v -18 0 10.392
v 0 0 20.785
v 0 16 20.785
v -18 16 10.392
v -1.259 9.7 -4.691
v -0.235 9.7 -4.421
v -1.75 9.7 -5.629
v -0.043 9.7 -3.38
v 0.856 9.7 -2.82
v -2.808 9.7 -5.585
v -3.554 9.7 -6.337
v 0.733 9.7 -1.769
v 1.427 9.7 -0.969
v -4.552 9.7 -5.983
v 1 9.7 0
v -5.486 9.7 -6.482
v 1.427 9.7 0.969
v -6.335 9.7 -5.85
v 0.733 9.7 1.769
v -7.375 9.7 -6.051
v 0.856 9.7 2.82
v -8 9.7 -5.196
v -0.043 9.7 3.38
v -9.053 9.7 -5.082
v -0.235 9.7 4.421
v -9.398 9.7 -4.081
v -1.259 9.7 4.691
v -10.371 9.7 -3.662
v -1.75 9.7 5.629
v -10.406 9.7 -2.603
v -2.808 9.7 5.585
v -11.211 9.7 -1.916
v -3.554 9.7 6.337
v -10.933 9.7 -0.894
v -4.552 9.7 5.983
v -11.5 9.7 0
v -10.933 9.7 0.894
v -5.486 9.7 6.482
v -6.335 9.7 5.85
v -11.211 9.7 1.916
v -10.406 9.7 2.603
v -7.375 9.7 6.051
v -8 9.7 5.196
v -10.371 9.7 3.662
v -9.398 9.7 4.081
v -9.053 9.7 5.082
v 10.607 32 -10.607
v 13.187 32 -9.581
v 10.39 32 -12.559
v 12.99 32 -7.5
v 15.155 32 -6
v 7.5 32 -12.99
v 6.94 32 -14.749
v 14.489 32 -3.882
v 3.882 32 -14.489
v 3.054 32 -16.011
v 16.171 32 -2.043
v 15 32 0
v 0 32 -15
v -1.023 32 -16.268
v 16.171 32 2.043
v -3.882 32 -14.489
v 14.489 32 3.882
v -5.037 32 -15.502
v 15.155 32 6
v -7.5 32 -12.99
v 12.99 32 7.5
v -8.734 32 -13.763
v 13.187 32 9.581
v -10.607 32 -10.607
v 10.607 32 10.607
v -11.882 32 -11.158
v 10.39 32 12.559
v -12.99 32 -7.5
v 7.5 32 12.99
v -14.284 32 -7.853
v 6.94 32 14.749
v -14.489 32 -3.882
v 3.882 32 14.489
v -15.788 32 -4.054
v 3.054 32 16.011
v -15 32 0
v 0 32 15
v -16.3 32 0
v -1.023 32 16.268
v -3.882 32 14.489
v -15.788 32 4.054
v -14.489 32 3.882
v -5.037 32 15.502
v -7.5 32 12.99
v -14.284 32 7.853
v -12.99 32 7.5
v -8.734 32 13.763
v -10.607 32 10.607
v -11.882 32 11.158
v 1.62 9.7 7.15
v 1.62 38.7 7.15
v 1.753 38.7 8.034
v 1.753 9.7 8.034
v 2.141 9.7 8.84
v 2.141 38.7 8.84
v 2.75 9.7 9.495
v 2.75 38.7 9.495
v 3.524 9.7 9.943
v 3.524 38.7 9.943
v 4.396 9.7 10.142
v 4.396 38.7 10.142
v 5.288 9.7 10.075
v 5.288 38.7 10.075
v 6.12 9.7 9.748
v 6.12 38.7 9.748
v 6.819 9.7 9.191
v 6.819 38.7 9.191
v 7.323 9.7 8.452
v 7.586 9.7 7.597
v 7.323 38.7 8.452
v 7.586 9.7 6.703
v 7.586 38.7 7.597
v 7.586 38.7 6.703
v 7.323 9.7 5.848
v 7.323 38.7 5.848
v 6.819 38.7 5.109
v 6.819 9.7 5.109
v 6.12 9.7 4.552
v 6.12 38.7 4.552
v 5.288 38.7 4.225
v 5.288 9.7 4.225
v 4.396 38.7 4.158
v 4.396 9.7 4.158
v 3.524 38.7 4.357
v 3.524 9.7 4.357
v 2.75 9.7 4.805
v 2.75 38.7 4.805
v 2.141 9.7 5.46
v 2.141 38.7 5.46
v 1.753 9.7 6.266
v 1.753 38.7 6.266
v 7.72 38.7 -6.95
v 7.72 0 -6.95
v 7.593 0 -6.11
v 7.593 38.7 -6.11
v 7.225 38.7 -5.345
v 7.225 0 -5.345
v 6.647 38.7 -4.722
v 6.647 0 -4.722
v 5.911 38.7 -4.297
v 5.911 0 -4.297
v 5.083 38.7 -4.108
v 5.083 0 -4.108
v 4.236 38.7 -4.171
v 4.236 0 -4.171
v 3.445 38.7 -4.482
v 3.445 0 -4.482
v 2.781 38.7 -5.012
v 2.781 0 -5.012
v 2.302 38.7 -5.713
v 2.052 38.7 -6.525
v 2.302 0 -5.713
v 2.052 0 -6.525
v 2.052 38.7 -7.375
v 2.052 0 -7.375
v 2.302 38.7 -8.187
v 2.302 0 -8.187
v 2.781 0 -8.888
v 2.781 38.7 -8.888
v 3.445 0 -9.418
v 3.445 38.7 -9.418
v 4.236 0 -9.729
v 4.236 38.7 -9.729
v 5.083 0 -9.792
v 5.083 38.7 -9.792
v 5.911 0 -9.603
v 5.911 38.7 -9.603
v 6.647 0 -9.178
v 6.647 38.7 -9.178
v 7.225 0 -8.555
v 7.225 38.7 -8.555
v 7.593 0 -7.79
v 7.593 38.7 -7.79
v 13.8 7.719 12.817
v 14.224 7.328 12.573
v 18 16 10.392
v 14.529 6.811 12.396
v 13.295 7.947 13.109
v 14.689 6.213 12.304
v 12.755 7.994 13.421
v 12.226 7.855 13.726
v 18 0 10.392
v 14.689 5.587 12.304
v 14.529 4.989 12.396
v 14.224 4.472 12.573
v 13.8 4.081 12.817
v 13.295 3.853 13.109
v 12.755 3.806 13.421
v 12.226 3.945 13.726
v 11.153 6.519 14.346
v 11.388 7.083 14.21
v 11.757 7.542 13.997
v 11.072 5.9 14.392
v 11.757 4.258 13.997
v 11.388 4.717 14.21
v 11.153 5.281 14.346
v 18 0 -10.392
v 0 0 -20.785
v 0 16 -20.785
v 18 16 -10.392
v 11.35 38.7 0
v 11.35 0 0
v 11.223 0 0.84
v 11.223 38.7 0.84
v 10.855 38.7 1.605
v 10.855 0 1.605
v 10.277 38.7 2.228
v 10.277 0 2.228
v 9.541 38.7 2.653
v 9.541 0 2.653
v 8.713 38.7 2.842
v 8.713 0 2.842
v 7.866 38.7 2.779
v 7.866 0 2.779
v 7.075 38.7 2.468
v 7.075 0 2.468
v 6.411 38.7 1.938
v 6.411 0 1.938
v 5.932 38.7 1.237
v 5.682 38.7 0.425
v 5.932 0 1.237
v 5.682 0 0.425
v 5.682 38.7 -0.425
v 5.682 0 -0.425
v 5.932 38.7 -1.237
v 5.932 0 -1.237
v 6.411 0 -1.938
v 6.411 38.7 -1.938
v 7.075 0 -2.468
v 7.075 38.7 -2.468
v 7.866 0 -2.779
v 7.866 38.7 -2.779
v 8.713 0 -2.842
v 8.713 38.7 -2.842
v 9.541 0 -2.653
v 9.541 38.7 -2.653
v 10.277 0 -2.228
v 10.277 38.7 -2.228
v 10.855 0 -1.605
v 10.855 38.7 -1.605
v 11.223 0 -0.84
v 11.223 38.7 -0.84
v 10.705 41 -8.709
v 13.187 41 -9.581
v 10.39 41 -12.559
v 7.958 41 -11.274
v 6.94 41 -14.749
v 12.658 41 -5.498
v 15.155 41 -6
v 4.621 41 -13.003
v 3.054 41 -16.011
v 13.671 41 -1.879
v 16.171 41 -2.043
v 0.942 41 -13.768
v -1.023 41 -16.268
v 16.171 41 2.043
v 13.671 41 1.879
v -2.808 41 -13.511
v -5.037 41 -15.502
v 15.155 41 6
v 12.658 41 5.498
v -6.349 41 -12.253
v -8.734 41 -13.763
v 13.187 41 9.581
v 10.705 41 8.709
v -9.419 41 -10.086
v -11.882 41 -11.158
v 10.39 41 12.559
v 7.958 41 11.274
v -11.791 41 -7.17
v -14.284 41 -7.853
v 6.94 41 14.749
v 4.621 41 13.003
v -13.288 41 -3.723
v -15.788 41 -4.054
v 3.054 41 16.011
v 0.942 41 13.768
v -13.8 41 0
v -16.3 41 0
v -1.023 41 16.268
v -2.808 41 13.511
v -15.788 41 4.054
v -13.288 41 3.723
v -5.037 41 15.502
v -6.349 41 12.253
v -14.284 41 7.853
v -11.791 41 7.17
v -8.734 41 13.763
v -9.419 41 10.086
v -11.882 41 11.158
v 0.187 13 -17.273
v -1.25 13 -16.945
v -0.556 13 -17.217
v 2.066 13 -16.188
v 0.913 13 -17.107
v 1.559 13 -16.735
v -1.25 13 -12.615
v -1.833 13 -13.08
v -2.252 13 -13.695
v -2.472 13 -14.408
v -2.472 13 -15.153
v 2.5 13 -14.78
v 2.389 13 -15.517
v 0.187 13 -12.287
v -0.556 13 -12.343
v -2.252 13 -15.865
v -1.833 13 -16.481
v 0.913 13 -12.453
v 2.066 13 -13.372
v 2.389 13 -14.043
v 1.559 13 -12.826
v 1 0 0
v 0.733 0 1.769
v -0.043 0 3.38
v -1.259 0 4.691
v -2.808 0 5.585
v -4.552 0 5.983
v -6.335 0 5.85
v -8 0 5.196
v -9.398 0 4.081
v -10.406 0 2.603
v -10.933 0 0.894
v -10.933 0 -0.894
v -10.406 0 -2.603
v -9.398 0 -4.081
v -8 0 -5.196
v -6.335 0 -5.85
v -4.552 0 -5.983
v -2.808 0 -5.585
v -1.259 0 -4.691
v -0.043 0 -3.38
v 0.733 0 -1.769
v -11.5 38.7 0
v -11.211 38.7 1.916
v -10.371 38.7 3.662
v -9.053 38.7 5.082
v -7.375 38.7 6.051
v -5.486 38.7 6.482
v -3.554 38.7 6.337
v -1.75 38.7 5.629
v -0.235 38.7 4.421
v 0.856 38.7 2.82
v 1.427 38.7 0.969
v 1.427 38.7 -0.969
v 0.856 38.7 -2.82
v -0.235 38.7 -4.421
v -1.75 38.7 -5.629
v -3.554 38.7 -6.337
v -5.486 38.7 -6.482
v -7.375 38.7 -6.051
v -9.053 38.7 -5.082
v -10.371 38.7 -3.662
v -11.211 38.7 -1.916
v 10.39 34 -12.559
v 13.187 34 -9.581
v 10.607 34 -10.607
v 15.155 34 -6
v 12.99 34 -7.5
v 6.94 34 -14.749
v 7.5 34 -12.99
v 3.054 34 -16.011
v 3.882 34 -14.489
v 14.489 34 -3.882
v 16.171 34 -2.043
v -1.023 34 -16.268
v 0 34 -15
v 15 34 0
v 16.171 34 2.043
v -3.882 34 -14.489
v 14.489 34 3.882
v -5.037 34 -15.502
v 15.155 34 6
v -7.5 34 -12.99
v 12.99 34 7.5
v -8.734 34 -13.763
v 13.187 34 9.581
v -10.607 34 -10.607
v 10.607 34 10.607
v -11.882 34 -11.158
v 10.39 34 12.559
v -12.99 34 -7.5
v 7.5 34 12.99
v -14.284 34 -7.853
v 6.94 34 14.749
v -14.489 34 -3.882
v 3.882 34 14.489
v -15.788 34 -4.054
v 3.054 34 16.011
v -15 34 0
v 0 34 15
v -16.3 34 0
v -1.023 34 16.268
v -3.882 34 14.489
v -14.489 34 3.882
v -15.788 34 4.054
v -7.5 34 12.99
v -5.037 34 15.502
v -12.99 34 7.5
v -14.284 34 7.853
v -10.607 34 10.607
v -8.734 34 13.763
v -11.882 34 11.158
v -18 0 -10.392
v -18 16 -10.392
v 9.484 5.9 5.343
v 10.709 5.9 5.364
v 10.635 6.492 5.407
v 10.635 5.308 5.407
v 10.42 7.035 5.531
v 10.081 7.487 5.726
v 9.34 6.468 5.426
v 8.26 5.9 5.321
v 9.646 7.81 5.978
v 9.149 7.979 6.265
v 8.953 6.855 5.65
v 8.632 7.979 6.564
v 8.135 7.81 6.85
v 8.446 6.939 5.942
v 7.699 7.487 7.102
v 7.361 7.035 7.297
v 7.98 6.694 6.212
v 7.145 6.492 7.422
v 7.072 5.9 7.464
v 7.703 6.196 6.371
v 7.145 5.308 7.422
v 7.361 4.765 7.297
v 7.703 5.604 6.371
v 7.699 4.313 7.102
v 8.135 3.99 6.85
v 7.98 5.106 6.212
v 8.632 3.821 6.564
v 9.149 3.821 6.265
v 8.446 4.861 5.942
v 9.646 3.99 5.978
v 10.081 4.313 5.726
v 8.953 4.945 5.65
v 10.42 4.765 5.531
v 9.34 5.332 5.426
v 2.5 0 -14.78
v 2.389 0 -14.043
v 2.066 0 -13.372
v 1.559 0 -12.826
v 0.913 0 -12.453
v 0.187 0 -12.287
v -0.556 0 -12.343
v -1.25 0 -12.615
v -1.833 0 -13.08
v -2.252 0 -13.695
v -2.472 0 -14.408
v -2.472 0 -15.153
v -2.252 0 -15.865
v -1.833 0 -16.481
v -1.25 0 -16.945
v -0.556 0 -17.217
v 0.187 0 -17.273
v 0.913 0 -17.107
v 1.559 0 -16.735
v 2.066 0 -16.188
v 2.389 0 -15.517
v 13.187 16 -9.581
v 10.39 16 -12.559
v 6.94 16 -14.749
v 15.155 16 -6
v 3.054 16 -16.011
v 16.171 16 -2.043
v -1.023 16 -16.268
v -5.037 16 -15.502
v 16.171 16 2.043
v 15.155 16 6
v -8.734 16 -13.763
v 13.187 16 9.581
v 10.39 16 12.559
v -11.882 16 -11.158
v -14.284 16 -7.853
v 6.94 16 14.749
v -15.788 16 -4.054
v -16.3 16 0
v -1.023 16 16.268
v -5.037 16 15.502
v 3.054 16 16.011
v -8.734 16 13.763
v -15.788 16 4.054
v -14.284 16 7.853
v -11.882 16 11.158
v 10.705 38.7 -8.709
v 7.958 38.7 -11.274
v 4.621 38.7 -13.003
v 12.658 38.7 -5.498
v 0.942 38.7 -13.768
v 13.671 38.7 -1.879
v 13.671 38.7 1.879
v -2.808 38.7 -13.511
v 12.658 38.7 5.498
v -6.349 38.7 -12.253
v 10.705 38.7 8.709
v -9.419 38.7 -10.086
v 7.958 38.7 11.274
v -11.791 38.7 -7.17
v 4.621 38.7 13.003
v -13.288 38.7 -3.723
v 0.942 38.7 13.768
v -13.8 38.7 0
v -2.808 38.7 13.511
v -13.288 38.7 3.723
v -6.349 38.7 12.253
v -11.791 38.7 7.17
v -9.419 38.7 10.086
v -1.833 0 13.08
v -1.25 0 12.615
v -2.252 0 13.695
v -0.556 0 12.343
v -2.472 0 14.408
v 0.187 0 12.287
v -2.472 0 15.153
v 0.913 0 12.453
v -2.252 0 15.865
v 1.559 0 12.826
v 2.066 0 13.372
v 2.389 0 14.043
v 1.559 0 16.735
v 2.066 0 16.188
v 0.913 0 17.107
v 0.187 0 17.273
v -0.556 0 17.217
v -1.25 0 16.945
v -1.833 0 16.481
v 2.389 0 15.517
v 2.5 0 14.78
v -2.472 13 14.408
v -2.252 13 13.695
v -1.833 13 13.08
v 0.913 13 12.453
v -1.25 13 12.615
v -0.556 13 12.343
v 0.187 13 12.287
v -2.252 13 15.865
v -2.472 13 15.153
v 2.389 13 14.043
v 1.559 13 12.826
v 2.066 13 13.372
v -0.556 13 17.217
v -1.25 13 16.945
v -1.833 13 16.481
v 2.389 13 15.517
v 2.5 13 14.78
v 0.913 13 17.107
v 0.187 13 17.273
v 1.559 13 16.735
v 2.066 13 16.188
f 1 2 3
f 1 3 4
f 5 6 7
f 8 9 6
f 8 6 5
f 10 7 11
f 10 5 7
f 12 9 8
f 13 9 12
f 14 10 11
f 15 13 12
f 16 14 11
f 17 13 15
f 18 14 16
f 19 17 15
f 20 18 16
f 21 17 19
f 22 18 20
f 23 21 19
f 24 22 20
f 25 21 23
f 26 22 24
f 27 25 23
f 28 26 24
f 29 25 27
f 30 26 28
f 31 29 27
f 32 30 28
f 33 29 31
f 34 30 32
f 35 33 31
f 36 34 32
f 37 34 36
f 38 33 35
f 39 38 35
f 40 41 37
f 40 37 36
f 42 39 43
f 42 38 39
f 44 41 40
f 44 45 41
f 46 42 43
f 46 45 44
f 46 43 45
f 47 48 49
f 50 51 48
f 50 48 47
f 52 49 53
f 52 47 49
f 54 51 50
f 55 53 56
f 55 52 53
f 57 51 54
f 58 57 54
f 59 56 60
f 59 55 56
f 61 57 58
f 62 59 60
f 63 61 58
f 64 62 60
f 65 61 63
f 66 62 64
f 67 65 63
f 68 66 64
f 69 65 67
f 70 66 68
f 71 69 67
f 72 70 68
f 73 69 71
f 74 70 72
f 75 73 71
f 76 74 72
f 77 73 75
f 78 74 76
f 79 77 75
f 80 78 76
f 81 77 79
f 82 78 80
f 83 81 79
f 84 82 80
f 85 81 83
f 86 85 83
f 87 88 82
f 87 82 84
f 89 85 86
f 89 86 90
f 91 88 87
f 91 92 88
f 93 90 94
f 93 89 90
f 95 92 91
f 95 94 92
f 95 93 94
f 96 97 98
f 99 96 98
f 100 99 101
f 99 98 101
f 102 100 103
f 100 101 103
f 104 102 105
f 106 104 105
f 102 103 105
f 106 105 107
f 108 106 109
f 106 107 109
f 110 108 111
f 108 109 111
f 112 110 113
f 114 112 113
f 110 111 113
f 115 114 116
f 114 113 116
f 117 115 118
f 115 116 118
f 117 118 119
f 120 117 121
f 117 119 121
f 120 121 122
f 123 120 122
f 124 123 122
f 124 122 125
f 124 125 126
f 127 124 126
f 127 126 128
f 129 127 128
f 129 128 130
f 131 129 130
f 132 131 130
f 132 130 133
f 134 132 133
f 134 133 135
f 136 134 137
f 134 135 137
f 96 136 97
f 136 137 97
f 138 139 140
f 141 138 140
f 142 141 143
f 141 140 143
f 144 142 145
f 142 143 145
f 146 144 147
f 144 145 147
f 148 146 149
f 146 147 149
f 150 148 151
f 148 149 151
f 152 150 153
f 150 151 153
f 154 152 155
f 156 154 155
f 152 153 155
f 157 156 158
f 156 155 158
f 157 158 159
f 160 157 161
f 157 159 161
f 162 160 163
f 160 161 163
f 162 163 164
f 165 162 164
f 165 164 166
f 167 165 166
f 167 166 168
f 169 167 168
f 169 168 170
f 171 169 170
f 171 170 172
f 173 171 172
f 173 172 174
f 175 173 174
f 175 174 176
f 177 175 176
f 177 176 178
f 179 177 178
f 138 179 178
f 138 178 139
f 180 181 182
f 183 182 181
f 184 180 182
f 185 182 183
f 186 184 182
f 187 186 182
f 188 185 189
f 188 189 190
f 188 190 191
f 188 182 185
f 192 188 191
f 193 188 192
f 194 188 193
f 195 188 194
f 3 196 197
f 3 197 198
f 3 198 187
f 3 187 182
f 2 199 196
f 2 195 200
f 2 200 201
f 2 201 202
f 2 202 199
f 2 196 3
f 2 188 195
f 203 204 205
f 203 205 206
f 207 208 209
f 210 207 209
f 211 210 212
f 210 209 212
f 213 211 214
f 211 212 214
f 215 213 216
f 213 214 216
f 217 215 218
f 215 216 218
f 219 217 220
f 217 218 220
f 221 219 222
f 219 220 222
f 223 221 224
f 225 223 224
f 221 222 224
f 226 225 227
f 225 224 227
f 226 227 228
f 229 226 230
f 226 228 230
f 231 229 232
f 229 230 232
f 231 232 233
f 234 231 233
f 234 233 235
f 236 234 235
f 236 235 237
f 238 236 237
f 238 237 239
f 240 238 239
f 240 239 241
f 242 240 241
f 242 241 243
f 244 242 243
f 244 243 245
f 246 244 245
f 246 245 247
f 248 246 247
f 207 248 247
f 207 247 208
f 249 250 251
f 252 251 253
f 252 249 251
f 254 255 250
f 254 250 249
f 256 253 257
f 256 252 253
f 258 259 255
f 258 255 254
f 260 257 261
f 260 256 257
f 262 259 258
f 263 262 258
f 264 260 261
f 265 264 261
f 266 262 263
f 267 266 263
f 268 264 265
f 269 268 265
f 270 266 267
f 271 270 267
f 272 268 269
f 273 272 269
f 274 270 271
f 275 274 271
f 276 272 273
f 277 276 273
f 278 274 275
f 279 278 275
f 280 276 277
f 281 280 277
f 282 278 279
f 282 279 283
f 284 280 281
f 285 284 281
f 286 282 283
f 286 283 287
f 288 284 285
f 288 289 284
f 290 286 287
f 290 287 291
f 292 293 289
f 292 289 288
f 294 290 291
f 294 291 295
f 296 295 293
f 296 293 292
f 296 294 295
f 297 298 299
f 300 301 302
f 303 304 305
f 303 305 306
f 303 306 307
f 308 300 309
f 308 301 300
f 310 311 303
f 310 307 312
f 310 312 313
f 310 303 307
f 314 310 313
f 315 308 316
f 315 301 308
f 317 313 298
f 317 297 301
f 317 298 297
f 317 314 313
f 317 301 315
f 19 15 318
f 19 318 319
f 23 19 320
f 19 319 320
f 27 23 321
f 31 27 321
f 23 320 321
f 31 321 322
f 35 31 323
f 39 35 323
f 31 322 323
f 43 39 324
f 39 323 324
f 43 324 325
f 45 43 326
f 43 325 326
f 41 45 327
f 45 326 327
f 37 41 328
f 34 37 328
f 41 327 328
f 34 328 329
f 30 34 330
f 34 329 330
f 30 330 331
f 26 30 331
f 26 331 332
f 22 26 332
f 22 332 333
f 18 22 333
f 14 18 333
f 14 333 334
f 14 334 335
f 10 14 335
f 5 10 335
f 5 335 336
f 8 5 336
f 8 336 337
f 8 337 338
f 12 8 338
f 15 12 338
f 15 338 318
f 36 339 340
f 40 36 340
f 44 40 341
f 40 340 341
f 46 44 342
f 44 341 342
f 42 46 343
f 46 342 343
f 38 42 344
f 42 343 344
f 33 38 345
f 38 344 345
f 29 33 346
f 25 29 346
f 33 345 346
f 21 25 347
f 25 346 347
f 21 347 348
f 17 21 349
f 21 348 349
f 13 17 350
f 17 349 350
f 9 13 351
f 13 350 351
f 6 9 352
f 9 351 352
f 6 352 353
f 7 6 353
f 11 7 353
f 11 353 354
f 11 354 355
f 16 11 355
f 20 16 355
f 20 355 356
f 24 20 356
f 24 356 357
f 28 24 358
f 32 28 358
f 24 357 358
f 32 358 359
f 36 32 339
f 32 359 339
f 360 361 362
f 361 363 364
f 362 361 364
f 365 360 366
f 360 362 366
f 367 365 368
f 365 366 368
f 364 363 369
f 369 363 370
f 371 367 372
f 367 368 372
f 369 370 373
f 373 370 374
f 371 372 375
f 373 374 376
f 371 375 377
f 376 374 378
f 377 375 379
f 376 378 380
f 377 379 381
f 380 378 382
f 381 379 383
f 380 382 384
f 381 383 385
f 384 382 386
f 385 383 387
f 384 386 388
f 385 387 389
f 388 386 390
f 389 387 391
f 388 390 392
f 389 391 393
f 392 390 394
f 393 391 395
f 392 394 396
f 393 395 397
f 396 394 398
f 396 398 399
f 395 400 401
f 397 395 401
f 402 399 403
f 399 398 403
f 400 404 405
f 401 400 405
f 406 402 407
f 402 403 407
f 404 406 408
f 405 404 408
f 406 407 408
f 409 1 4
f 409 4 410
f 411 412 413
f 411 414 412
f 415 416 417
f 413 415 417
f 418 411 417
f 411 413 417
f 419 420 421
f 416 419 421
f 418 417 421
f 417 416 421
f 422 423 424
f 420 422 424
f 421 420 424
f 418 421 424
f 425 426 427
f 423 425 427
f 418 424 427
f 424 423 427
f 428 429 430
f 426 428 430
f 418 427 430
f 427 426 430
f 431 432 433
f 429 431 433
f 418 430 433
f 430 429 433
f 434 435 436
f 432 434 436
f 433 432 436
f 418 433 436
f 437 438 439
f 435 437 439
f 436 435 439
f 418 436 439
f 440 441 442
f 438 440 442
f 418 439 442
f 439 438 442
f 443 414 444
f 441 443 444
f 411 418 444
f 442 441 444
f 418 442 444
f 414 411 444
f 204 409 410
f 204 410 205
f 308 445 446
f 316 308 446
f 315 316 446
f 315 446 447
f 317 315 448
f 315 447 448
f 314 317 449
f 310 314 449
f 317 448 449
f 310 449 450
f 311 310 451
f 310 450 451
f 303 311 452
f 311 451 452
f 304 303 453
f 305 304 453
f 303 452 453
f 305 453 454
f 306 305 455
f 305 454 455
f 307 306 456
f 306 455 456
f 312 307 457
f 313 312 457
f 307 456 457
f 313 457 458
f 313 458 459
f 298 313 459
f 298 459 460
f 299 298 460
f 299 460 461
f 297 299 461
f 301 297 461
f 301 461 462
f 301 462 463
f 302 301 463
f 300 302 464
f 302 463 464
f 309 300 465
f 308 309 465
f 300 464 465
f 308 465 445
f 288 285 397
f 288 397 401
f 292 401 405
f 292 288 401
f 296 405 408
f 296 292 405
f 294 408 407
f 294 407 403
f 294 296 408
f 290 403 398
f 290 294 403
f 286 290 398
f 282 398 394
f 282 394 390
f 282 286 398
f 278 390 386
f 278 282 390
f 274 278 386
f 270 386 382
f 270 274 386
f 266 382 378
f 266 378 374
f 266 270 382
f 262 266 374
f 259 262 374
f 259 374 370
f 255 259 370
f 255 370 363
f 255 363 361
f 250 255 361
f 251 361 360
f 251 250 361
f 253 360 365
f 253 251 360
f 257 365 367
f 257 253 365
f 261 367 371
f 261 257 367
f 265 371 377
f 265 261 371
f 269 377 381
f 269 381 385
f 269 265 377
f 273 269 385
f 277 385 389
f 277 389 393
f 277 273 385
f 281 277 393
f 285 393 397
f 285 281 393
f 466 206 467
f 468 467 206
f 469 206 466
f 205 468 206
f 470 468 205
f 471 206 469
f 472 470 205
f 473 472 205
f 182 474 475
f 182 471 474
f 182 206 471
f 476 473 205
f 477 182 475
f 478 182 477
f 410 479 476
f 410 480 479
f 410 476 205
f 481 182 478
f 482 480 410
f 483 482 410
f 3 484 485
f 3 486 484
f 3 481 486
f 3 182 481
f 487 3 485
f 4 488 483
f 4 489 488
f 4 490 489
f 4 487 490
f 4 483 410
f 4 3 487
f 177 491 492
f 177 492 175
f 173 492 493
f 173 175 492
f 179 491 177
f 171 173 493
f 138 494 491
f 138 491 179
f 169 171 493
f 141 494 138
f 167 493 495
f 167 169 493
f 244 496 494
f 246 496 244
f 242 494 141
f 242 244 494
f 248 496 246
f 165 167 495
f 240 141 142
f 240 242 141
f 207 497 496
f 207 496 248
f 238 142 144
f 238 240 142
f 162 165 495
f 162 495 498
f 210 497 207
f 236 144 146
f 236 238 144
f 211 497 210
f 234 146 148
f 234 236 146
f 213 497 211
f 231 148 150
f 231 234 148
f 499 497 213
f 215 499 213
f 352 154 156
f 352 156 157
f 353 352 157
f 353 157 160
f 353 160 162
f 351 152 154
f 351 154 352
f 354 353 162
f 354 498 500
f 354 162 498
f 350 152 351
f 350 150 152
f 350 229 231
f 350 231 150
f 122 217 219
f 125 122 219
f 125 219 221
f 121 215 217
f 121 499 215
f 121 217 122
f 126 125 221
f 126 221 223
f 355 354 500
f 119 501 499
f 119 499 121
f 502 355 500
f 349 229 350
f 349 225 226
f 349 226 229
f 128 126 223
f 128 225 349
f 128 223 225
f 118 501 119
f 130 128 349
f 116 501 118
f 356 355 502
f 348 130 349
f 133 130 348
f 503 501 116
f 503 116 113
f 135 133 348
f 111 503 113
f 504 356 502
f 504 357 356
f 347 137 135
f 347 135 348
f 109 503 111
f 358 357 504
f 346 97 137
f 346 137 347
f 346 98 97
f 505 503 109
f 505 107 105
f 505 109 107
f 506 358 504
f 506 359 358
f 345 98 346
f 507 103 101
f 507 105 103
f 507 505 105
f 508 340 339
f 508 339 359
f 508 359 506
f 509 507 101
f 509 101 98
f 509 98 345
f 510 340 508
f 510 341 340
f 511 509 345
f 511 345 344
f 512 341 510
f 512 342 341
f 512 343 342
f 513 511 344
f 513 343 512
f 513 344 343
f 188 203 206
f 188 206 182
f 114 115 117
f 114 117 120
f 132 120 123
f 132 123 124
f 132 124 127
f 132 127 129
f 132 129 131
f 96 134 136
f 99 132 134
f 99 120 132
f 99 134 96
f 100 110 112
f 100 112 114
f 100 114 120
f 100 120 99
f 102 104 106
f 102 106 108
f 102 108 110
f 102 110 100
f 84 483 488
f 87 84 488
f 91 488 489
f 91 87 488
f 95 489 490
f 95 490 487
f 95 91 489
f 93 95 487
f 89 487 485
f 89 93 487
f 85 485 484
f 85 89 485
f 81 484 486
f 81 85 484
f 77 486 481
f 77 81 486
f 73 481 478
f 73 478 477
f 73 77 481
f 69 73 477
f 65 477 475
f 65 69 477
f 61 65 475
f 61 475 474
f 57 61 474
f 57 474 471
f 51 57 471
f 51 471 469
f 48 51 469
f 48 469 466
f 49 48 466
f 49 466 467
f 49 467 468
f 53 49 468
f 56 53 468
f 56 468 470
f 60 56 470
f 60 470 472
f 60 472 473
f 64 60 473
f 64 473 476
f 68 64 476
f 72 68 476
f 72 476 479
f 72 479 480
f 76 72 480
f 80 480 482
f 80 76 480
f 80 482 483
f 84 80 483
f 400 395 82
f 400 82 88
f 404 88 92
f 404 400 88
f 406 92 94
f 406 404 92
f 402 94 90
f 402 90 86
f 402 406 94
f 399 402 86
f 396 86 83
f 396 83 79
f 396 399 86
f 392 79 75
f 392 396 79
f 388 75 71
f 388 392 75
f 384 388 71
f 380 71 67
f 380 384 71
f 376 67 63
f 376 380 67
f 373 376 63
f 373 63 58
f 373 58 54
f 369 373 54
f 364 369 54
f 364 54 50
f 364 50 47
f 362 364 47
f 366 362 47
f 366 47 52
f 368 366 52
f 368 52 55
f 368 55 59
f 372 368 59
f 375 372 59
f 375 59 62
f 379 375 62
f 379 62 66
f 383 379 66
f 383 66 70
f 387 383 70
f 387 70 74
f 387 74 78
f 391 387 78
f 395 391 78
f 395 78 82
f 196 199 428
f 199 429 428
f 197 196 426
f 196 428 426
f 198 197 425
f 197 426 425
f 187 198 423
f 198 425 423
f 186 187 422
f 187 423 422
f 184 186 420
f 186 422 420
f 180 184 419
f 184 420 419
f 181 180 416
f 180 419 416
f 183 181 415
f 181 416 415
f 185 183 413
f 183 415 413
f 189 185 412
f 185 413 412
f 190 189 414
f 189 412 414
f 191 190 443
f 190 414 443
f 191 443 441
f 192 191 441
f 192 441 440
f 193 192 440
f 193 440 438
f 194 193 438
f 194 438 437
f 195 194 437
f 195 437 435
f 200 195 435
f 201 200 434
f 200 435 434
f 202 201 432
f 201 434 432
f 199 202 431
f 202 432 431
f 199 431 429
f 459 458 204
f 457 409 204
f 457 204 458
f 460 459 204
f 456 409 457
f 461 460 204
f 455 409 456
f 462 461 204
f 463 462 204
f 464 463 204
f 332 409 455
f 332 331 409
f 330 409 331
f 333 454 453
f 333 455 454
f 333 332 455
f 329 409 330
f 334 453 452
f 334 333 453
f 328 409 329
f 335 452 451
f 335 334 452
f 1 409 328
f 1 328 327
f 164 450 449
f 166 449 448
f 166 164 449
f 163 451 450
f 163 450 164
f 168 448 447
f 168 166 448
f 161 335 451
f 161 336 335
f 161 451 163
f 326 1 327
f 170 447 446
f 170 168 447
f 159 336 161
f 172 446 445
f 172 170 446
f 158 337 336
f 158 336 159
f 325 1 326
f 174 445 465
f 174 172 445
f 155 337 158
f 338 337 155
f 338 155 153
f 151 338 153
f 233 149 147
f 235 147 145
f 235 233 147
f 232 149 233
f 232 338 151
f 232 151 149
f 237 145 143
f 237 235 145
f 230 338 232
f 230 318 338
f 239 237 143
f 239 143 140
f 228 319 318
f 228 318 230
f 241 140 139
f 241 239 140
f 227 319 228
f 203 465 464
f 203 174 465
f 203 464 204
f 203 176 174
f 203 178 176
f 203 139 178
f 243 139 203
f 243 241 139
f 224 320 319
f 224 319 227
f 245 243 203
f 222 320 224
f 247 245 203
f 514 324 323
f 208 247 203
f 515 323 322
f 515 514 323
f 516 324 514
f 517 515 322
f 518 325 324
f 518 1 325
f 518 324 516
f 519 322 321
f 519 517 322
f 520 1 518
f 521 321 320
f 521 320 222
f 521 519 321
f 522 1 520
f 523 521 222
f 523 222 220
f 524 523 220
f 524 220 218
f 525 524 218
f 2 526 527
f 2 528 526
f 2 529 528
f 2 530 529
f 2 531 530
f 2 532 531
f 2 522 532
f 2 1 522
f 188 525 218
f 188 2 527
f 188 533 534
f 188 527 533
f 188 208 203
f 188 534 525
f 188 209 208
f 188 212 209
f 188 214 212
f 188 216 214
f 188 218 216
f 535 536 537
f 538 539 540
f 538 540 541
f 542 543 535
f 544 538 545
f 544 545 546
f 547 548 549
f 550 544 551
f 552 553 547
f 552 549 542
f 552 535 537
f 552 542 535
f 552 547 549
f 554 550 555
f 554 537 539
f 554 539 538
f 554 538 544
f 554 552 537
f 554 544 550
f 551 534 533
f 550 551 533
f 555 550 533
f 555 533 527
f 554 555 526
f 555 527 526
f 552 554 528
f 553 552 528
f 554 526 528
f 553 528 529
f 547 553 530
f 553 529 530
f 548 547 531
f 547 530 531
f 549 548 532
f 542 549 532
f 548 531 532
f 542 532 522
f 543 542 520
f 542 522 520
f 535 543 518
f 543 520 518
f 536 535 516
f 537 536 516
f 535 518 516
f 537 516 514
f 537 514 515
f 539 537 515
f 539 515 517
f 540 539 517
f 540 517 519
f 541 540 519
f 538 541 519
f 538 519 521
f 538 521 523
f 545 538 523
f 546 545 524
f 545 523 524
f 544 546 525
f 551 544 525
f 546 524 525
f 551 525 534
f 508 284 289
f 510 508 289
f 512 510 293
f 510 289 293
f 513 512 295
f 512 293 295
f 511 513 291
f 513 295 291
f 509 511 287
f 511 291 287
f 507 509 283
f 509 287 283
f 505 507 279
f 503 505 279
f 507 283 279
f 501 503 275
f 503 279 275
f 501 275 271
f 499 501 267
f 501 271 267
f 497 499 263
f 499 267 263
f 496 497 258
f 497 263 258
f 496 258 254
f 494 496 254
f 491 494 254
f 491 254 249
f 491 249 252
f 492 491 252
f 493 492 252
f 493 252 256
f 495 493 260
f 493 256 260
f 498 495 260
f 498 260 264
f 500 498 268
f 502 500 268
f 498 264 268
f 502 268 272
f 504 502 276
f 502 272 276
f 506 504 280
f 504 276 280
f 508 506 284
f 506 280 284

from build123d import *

# Parameters (mm, degrees)
F1_DEPTH  = 41
F2_R      = 24.5503927786
F2_R_2    = 16.3
F3_DEPTH  = 25
F4_R      = 24.0523887052
F4_R_2    = 15
F5_DEPTH  = 9
F6_R      = 16.3
F7_DEPTH  = 7
F8_R      = 2.85
F9_DEPTH  = 41.001
F10_R     = 13.8
F11_DEPTH = 2.3
F12_R     = 6
F13_DEPTH = 41.001
F14_R     = 6.5
F15_DEPTH = 29
F16_R     = 2.5
F17_DEPTH = 13
F18_R     = 2.5
F19_DEPTH = 13
F21_D     = 4.2
F21_DEPTH = 8
F21_TIP   = 1.2618073
F22_R     = 3
F23_DEPTH = 29


with BuildPart() as f1:
    # F0 (on Front) → F1 (new body)
    with BuildSketch(Plane.XZ):
        Polygon((0, -20.7846096908), (18, -10.3923048454), (18, 10.3923048454), (0, 20.7846096908), (-18, 10.3923048454), (-18, -10.3923048454), align=None)
    extrude(amount=-F1_DEPTH)

    # F2 (on face) → F3 (cut)
    with BuildSketch(Plane(origin=(0, 41, 0), x_dir=(-1, 0, 0), z_dir=(0, 1, 0))):
        Circle(F2_R)
        Circle(F2_R_2, mode=Mode.SUBTRACT)
    extrude(amount=-F3_DEPTH, mode=Mode.SUBTRACT)

    # F4 (on face) → F5 (cut)
    with BuildSketch(Plane(origin=(0, 41, 0), x_dir=(-1, 0, 0), z_dir=(0, 1, 0))):
        Circle(F4_R)
        Circle(F4_R_2, mode=Mode.SUBTRACT)
    extrude(amount=-F5_DEPTH, mode=Mode.SUBTRACT)

    # F6 (on face) → F7 (join)
    with BuildSketch(Plane(origin=(0, 41, 0), x_dir=(-1, 0, 0), z_dir=(0, 1, 0))):
        Circle(F6_R)
    extrude(amount=-F7_DEPTH)

    # F8 (on face) → F9 (cut, through all)
    with BuildSketch(Plane.XZ):
        with Locations((4.87, -6.95)):
            Circle(F8_R)
        with Locations((8.5, 0)):
            Circle(F8_R)
    extrude(amount=-F9_DEPTH, mode=Mode.SUBTRACT)

    # F10 (on face) → F11 (cut)
    with BuildSketch(Plane(origin=(0, 41, 0), x_dir=(-1, 0, 0), z_dir=(0, 1, 0))):
        Circle(F10_R)
    extrude(amount=-F11_DEPTH, mode=Mode.SUBTRACT)

    # F12 (on face) → F13 (cut, through all)
    with BuildSketch(Plane.XZ):
        with Locations((-5, 0)):
            Circle(F12_R)
    extrude(amount=-F13_DEPTH, mode=Mode.SUBTRACT)

    # F14 (on face) → F15 (cut)
    with BuildSketch(Plane(origin=(0, 38.7, 0), x_dir=(-1, 0, 0), z_dir=(0, 1, 0))):
        with Locations((5, 0)):
            Circle(F14_R)
    extrude(amount=-F15_DEPTH, mode=Mode.SUBTRACT)

    # F16 (on face) → F17 (cut)
    with BuildSketch(Plane.XZ):
        with Locations((0, 14.7801668913)):
            Circle(F16_R)
    extrude(amount=-F17_DEPTH, mode=Mode.SUBTRACT)

    # F18 (on face) → F19 (cut)
    with BuildSketch(Plane.XZ):
        with Locations((0, -14.7801668913)):
            Circle(F18_R)
    extrude(amount=-F19_DEPTH, mode=Mode.SUBTRACT)

    # F21
    with Locations(Plane(origin=(9, 0, 15.5884572681), x_dir=(0.8660254038, 0, -0.5), z_dir=(0.5, 0, 0.8660254038))):
        with Locations((4.4923048454, 5.9)):
            Hole(F21_D / 2, depth=F21_DEPTH)
            with Locations((0, 0, -(F21_DEPTH + F21_TIP / 2))):  # 118° drill point
                Cone(0, F21_D / 2, F21_TIP, mode=Mode.SUBTRACT)

    # F22 (on face) → F23 (cut)
    with BuildSketch(Plane(origin=(0, 38.7, 0), x_dir=(-1, 0, 0), z_dir=(0, 1, 0))):
        with Locations((-4.62, 7.15)):
            Circle(F22_R)
    extrude(amount=-F23_DEPTH, mode=Mode.SUBTRACT)


solid = f1.part
